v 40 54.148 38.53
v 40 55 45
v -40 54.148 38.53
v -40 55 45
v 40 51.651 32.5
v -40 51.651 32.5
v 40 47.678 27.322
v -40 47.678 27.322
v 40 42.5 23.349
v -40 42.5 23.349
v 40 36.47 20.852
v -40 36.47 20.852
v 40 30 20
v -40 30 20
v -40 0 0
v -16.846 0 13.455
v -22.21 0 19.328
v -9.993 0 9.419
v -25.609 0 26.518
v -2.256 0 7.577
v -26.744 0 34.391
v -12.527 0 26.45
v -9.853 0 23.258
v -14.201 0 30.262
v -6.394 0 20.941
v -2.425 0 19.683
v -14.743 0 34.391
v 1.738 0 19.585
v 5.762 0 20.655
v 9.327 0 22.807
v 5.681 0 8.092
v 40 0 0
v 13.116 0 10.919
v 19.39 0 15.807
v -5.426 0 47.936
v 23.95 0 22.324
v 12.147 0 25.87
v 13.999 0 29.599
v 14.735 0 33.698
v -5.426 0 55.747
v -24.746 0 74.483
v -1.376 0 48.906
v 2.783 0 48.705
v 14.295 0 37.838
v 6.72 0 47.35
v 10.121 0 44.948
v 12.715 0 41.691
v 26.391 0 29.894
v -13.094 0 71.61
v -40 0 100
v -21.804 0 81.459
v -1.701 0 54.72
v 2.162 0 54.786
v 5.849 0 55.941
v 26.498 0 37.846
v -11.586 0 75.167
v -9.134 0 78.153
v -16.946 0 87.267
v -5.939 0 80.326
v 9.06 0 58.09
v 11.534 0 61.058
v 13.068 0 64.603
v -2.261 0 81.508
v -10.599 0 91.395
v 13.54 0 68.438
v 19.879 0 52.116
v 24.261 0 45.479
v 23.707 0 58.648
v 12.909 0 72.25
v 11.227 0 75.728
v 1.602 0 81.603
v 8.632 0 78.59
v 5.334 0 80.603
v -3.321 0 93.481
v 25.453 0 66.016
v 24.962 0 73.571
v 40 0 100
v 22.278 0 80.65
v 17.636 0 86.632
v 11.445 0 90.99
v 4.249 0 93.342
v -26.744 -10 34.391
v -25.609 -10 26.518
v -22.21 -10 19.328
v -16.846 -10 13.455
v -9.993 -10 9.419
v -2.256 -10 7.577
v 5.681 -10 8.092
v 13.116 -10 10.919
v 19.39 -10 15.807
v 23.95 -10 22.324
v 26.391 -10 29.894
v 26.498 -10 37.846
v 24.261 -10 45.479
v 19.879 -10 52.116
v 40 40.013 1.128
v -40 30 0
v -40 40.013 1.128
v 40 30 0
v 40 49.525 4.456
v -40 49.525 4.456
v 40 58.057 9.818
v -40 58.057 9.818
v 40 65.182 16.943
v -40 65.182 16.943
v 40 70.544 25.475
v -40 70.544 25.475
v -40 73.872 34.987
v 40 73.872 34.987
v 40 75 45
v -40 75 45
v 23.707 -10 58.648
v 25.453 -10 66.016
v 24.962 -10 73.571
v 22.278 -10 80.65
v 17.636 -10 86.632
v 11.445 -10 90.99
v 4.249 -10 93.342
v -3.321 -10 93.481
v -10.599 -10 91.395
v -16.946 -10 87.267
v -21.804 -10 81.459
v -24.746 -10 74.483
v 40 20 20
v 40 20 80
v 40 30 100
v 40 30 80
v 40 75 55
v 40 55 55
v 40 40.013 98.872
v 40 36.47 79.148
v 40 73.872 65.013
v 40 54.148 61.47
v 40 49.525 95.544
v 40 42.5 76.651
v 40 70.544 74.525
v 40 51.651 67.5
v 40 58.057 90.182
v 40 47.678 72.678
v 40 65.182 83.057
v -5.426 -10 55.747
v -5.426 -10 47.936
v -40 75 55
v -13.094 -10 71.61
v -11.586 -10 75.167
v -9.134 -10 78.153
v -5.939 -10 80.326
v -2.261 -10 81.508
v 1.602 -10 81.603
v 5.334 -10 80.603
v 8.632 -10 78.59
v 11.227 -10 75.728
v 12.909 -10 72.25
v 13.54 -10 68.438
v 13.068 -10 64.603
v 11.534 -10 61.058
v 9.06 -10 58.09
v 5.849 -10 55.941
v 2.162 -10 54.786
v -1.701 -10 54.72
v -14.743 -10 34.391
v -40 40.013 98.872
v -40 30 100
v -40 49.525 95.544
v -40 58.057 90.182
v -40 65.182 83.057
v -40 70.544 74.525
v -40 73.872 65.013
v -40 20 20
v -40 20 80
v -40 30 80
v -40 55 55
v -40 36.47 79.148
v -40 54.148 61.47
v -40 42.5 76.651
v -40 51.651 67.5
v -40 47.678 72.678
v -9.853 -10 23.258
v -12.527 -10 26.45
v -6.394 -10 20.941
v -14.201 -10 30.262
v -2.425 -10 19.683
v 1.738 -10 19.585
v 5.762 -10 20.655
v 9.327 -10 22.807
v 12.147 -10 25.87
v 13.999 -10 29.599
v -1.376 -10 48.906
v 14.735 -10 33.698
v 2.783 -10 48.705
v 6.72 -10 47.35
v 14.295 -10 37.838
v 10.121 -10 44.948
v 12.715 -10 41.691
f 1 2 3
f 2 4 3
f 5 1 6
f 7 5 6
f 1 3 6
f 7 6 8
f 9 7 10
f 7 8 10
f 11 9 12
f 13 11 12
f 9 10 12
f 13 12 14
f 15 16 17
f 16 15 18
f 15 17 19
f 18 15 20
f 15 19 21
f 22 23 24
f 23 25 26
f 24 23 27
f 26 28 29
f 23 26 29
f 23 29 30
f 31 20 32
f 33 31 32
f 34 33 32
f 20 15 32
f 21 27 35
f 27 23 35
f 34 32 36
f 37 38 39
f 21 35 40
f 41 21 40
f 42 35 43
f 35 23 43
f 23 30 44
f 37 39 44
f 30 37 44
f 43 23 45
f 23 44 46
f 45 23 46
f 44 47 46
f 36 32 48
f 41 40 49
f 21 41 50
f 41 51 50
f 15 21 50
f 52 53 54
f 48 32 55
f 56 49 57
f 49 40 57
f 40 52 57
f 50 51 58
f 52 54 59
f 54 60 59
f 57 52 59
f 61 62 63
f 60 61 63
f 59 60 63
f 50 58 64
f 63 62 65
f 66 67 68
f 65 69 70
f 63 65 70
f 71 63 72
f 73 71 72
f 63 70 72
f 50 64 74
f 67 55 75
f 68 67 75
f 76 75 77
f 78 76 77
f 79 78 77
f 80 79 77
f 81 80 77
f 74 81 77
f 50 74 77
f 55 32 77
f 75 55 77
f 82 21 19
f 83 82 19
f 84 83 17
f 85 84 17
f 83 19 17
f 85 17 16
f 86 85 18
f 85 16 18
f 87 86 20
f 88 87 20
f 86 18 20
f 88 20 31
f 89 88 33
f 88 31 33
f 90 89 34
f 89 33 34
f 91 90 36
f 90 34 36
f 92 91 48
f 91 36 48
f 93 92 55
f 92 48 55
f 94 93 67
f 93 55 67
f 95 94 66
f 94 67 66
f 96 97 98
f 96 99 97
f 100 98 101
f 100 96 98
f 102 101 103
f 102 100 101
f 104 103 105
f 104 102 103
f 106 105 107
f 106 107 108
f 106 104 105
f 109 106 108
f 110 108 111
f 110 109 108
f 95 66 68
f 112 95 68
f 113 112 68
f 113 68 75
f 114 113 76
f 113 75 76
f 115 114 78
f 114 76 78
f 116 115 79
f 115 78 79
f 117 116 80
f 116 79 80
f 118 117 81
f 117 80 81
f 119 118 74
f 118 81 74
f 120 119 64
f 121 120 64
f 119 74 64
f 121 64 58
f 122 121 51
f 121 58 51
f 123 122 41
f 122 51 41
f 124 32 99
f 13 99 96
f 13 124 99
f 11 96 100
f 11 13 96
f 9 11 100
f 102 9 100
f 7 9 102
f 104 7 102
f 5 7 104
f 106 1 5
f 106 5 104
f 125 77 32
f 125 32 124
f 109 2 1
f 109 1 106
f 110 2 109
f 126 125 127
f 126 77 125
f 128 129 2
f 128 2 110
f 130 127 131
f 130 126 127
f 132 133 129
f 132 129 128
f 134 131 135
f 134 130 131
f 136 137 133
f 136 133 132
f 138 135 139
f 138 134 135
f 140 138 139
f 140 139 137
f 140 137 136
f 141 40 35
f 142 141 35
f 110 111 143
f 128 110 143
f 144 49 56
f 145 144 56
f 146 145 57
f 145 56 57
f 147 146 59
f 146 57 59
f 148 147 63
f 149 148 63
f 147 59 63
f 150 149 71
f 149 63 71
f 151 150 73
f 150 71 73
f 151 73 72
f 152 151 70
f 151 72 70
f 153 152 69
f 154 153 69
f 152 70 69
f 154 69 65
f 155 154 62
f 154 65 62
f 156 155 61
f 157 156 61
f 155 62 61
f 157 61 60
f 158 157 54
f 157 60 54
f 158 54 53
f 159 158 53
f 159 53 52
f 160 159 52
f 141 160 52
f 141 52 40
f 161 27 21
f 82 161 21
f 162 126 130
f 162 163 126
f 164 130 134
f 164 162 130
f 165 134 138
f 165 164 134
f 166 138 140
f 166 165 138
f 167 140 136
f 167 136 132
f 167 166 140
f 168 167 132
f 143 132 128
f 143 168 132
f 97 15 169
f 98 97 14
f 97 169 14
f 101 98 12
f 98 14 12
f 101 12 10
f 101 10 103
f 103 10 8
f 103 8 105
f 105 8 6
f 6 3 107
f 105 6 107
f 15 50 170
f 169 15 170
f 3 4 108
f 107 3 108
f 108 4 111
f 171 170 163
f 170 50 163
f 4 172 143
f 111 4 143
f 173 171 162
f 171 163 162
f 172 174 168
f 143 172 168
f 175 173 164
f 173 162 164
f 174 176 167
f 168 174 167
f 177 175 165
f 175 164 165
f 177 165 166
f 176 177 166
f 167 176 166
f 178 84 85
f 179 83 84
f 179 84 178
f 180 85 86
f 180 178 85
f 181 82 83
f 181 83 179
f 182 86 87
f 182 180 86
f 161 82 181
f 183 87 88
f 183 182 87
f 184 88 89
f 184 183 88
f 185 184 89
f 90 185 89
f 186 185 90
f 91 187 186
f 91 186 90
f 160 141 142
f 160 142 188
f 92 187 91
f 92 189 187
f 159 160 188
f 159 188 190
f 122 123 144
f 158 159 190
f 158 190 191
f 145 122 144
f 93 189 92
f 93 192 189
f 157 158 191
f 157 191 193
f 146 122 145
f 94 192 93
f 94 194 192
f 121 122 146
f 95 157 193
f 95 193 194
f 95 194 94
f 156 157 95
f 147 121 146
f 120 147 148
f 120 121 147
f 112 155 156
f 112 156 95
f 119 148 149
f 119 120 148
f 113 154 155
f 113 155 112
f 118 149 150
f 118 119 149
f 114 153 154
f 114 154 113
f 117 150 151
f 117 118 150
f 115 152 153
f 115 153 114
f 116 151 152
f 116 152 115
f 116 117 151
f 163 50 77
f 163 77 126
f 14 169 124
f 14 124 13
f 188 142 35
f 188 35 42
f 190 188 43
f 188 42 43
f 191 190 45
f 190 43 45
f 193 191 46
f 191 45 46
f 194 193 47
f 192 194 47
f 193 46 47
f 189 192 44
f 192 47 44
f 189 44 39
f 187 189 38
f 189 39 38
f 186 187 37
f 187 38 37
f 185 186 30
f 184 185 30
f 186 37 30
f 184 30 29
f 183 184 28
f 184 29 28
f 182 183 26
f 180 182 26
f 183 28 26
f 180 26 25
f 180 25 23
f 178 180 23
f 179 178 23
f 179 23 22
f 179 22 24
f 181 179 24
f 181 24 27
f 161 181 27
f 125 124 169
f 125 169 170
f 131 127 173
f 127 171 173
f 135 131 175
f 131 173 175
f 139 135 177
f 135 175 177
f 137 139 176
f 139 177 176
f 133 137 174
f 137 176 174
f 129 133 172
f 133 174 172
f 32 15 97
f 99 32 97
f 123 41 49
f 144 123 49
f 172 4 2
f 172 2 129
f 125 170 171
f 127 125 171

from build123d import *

# Parameters (mm, degrees)
F0_W     = 75
F0_H     = 100
F0_W_2   = 35
F0_H_2   = 60
F1_DEPTH = 40
F2_R     = 25
F3_R     = 45
F5_DEPTH = 10


with BuildPart() as f1:
    # F0 (on Right) → F1 (new body, symmetric)
    with BuildSketch(Plane.YZ):
        with Locations((37.5, 50)):
            Rectangle(F0_W, F0_H)
        with Locations((37.5, 50)):
            Rectangle(F0_W_2, F0_H_2, mode=Mode.SUBTRACT)
    extrude(amount=F1_DEPTH, both=True)

    # F2
    f2_edges = [f1.edges().sort_by_distance(p)[0] for p in [
        (0, 55, 80),
        (0, 55, 20),
    ]]
    fillet(f2_edges, radius=F2_R)

    # F3
    f3_edges = [f1.edges().sort_by_distance(p)[0] for p in [
        (0, 75, 100),
        (0, 75, 0),
    ]]
    fillet(f3_edges, radius=F3_R)

    # F4 (on face) → F5 (join)
    with BuildSketch(Plane.XZ):
        with BuildLine():
            ThreePointArc((-26.743521, 34.39074), (9.504213, 9.227778), (19.879071, 52.116415))
            ThreePointArc((19.879071, 52.116415), (11.445172, 90.989948), (-24.74618, 74.483336))
            Line((-24.74618, 74.483336), (-13.094317, 71.610317))
            ThreePointArc((-13.094317, 71.610317), (12.192518, 74.049378), (-5.425539, 55.746998))
            Line((-5.425539, 55.746998), (-5.425539, 47.93552))
            ThreePointArc((-5.425539, 47.93552), (12.14738, 25.869751), (-14.743108, 34.39074))
            Line((-14.743108, 34.39074), (-26.743521, 34.39074))
        make_face()
    extrude(amount=F5_DEPTH)


solid = f1.part
